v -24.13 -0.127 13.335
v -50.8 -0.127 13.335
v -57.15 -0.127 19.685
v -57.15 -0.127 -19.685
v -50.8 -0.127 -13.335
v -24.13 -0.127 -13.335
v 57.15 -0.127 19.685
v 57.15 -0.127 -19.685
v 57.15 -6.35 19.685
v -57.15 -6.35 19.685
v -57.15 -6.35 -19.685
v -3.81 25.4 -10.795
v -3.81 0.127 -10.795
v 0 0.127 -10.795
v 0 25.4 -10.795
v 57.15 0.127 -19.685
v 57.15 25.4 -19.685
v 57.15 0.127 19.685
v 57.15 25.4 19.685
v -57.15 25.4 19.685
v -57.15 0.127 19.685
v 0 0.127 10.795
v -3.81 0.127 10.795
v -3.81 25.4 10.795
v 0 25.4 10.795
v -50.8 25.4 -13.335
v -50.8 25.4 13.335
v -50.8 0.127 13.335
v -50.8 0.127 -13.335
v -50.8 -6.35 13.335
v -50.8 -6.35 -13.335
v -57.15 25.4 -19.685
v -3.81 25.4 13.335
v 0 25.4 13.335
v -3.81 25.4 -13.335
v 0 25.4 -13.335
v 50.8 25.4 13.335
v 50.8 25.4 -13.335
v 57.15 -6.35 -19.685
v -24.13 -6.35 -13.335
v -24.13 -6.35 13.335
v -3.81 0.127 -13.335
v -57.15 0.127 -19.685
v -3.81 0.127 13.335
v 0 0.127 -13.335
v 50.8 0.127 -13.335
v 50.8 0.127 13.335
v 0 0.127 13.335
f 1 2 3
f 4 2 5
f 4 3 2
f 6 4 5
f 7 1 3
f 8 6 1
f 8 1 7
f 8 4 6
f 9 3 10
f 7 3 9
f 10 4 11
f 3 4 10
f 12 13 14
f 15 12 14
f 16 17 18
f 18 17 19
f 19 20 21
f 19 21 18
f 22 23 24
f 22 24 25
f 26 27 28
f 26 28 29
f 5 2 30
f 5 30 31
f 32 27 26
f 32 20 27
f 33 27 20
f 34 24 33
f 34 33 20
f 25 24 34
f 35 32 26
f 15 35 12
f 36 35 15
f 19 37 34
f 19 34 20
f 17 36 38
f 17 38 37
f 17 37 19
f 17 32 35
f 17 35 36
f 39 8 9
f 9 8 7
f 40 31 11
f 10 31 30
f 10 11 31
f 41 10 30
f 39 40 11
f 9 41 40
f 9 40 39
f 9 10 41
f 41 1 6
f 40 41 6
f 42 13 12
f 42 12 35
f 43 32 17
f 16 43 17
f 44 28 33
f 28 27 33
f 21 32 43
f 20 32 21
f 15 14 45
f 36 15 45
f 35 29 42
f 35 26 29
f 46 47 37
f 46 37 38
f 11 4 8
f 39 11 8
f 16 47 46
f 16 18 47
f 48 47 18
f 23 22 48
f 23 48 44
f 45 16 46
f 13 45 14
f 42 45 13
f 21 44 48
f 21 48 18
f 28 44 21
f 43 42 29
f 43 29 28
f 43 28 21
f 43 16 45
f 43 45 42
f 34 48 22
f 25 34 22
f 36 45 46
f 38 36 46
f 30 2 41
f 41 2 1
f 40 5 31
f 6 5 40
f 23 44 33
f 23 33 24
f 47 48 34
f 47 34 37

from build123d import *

# Parameters (mm, degrees)
SKETCH1_W                    = 114.3
SKETCH1_H                    = 39.37
SKETCH1_W_2                  = 101.6
SKETCH1_H_2                  = 26.67
BOSS_EXTRUDE1_DEPTH          = 25.4
SKETCH3_W                    = 114.3
SKETCH3_H                    = 39.37
BOSS_EXTRUDE2_DEPTH          = 6.35
SKETCH4_W                    = 3.81
SKETCH4_H                    = 2.54
BOSS_EXTRUDE3_DEPTH          = 25.4
SKETCH8_W                    = 26.67
SKETCH8_H                    = 26.67
CUT_EXTRUDE2_DEPTH           = 19.05
CUT_EXTRUDE_THIN1_DEPTH      = 74.900469552
CUT_EXTRUDE_THIN1_DEPTH_BACK = 74.900469552


with BuildPart() as part:
    # Sketch1 → Boss-Extrude1 (new body)
    with BuildSketch(Plane(origin=(0, 0, 0), x_dir=(1, 0, 0), z_dir=(0, 1, 0))):
        Rectangle(SKETCH1_W, SKETCH1_H)
        Rectangle(SKETCH1_W_2, SKETCH1_H_2, mode=Mode.SUBTRACT)
    extrude(amount=BOSS_EXTRUDE1_DEPTH)

    # Sketch3 → Boss-Extrude2 (add)
    with BuildSketch(Plane.XZ):
        Rectangle(SKETCH3_W, SKETCH3_H)
    extrude(amount=BOSS_EXTRUDE2_DEPTH)

    # Sketch4 → Boss-Extrude3 (add)
    with BuildSketch(Plane(origin=(0, 0, 0), x_dir=(1, 0, 0), z_dir=(0, 1, 0))):
        with Locations((-1.905, -12.065)):
            Rectangle(SKETCH4_W, SKETCH4_H)
        with Locations((-1.905, 12.065)):
            Rectangle(SKETCH4_W, SKETCH4_H)
    extrude(amount=BOSS_EXTRUDE3_DEPTH)

    # Sketch8 → Cut-Extrude2 (cut)
    with BuildSketch(Plane(origin=(0, 0, 0), x_dir=(1, 0, 0), z_dir=(0, 1, 0))):
        with Locations((-37.465, 0)):
            Rectangle(SKETCH8_W, SKETCH8_H)
    extrude(amount=-CUT_EXTRUDE2_DEPTH, mode=Mode.SUBTRACT)

    # Sketch7 → Cut-Extrude-Thin1 (cut, two sides: drawn at the far end of the back side and taken through both)
    with BuildSketch(Plane.XY.offset(19.685).offset(-CUT_EXTRUDE_THIN1_DEPTH_BACK)):
        Polygon((-57.15, -0.127), (0, -0.127), (57.15, -0.127), (57.15, 0.127), (0, 0.127), (-57.15, 0.127), align=None)
    extrude(amount=CUT_EXTRUDE_THIN1_DEPTH + CUT_EXTRUDE_THIN1_DEPTH_BACK, mode=Mode.SUBTRACT)


with BuildPart() as cut_extrude_thin1_piece_1:
    # of the separate pieces the step leaves, piece 1, a body of its own (cut_extrude_thin1_pieces)
    add(part.part.solids().sort_by_distance((-57.15, 25.4, 19.685))[0])


with BuildPart() as cut_extrude_thin1_piece_2:
    # of the separate pieces the step leaves, piece 2, a body of its own (cut_extrude_thin1_pieces)
    add(part.part.solids().sort_by_distance((-57.15, -0.127, 19.685))[0])


solid = Compound([cut_extrude_thin1_piece_1.part, cut_extrude_thin1_piece_2.part])
